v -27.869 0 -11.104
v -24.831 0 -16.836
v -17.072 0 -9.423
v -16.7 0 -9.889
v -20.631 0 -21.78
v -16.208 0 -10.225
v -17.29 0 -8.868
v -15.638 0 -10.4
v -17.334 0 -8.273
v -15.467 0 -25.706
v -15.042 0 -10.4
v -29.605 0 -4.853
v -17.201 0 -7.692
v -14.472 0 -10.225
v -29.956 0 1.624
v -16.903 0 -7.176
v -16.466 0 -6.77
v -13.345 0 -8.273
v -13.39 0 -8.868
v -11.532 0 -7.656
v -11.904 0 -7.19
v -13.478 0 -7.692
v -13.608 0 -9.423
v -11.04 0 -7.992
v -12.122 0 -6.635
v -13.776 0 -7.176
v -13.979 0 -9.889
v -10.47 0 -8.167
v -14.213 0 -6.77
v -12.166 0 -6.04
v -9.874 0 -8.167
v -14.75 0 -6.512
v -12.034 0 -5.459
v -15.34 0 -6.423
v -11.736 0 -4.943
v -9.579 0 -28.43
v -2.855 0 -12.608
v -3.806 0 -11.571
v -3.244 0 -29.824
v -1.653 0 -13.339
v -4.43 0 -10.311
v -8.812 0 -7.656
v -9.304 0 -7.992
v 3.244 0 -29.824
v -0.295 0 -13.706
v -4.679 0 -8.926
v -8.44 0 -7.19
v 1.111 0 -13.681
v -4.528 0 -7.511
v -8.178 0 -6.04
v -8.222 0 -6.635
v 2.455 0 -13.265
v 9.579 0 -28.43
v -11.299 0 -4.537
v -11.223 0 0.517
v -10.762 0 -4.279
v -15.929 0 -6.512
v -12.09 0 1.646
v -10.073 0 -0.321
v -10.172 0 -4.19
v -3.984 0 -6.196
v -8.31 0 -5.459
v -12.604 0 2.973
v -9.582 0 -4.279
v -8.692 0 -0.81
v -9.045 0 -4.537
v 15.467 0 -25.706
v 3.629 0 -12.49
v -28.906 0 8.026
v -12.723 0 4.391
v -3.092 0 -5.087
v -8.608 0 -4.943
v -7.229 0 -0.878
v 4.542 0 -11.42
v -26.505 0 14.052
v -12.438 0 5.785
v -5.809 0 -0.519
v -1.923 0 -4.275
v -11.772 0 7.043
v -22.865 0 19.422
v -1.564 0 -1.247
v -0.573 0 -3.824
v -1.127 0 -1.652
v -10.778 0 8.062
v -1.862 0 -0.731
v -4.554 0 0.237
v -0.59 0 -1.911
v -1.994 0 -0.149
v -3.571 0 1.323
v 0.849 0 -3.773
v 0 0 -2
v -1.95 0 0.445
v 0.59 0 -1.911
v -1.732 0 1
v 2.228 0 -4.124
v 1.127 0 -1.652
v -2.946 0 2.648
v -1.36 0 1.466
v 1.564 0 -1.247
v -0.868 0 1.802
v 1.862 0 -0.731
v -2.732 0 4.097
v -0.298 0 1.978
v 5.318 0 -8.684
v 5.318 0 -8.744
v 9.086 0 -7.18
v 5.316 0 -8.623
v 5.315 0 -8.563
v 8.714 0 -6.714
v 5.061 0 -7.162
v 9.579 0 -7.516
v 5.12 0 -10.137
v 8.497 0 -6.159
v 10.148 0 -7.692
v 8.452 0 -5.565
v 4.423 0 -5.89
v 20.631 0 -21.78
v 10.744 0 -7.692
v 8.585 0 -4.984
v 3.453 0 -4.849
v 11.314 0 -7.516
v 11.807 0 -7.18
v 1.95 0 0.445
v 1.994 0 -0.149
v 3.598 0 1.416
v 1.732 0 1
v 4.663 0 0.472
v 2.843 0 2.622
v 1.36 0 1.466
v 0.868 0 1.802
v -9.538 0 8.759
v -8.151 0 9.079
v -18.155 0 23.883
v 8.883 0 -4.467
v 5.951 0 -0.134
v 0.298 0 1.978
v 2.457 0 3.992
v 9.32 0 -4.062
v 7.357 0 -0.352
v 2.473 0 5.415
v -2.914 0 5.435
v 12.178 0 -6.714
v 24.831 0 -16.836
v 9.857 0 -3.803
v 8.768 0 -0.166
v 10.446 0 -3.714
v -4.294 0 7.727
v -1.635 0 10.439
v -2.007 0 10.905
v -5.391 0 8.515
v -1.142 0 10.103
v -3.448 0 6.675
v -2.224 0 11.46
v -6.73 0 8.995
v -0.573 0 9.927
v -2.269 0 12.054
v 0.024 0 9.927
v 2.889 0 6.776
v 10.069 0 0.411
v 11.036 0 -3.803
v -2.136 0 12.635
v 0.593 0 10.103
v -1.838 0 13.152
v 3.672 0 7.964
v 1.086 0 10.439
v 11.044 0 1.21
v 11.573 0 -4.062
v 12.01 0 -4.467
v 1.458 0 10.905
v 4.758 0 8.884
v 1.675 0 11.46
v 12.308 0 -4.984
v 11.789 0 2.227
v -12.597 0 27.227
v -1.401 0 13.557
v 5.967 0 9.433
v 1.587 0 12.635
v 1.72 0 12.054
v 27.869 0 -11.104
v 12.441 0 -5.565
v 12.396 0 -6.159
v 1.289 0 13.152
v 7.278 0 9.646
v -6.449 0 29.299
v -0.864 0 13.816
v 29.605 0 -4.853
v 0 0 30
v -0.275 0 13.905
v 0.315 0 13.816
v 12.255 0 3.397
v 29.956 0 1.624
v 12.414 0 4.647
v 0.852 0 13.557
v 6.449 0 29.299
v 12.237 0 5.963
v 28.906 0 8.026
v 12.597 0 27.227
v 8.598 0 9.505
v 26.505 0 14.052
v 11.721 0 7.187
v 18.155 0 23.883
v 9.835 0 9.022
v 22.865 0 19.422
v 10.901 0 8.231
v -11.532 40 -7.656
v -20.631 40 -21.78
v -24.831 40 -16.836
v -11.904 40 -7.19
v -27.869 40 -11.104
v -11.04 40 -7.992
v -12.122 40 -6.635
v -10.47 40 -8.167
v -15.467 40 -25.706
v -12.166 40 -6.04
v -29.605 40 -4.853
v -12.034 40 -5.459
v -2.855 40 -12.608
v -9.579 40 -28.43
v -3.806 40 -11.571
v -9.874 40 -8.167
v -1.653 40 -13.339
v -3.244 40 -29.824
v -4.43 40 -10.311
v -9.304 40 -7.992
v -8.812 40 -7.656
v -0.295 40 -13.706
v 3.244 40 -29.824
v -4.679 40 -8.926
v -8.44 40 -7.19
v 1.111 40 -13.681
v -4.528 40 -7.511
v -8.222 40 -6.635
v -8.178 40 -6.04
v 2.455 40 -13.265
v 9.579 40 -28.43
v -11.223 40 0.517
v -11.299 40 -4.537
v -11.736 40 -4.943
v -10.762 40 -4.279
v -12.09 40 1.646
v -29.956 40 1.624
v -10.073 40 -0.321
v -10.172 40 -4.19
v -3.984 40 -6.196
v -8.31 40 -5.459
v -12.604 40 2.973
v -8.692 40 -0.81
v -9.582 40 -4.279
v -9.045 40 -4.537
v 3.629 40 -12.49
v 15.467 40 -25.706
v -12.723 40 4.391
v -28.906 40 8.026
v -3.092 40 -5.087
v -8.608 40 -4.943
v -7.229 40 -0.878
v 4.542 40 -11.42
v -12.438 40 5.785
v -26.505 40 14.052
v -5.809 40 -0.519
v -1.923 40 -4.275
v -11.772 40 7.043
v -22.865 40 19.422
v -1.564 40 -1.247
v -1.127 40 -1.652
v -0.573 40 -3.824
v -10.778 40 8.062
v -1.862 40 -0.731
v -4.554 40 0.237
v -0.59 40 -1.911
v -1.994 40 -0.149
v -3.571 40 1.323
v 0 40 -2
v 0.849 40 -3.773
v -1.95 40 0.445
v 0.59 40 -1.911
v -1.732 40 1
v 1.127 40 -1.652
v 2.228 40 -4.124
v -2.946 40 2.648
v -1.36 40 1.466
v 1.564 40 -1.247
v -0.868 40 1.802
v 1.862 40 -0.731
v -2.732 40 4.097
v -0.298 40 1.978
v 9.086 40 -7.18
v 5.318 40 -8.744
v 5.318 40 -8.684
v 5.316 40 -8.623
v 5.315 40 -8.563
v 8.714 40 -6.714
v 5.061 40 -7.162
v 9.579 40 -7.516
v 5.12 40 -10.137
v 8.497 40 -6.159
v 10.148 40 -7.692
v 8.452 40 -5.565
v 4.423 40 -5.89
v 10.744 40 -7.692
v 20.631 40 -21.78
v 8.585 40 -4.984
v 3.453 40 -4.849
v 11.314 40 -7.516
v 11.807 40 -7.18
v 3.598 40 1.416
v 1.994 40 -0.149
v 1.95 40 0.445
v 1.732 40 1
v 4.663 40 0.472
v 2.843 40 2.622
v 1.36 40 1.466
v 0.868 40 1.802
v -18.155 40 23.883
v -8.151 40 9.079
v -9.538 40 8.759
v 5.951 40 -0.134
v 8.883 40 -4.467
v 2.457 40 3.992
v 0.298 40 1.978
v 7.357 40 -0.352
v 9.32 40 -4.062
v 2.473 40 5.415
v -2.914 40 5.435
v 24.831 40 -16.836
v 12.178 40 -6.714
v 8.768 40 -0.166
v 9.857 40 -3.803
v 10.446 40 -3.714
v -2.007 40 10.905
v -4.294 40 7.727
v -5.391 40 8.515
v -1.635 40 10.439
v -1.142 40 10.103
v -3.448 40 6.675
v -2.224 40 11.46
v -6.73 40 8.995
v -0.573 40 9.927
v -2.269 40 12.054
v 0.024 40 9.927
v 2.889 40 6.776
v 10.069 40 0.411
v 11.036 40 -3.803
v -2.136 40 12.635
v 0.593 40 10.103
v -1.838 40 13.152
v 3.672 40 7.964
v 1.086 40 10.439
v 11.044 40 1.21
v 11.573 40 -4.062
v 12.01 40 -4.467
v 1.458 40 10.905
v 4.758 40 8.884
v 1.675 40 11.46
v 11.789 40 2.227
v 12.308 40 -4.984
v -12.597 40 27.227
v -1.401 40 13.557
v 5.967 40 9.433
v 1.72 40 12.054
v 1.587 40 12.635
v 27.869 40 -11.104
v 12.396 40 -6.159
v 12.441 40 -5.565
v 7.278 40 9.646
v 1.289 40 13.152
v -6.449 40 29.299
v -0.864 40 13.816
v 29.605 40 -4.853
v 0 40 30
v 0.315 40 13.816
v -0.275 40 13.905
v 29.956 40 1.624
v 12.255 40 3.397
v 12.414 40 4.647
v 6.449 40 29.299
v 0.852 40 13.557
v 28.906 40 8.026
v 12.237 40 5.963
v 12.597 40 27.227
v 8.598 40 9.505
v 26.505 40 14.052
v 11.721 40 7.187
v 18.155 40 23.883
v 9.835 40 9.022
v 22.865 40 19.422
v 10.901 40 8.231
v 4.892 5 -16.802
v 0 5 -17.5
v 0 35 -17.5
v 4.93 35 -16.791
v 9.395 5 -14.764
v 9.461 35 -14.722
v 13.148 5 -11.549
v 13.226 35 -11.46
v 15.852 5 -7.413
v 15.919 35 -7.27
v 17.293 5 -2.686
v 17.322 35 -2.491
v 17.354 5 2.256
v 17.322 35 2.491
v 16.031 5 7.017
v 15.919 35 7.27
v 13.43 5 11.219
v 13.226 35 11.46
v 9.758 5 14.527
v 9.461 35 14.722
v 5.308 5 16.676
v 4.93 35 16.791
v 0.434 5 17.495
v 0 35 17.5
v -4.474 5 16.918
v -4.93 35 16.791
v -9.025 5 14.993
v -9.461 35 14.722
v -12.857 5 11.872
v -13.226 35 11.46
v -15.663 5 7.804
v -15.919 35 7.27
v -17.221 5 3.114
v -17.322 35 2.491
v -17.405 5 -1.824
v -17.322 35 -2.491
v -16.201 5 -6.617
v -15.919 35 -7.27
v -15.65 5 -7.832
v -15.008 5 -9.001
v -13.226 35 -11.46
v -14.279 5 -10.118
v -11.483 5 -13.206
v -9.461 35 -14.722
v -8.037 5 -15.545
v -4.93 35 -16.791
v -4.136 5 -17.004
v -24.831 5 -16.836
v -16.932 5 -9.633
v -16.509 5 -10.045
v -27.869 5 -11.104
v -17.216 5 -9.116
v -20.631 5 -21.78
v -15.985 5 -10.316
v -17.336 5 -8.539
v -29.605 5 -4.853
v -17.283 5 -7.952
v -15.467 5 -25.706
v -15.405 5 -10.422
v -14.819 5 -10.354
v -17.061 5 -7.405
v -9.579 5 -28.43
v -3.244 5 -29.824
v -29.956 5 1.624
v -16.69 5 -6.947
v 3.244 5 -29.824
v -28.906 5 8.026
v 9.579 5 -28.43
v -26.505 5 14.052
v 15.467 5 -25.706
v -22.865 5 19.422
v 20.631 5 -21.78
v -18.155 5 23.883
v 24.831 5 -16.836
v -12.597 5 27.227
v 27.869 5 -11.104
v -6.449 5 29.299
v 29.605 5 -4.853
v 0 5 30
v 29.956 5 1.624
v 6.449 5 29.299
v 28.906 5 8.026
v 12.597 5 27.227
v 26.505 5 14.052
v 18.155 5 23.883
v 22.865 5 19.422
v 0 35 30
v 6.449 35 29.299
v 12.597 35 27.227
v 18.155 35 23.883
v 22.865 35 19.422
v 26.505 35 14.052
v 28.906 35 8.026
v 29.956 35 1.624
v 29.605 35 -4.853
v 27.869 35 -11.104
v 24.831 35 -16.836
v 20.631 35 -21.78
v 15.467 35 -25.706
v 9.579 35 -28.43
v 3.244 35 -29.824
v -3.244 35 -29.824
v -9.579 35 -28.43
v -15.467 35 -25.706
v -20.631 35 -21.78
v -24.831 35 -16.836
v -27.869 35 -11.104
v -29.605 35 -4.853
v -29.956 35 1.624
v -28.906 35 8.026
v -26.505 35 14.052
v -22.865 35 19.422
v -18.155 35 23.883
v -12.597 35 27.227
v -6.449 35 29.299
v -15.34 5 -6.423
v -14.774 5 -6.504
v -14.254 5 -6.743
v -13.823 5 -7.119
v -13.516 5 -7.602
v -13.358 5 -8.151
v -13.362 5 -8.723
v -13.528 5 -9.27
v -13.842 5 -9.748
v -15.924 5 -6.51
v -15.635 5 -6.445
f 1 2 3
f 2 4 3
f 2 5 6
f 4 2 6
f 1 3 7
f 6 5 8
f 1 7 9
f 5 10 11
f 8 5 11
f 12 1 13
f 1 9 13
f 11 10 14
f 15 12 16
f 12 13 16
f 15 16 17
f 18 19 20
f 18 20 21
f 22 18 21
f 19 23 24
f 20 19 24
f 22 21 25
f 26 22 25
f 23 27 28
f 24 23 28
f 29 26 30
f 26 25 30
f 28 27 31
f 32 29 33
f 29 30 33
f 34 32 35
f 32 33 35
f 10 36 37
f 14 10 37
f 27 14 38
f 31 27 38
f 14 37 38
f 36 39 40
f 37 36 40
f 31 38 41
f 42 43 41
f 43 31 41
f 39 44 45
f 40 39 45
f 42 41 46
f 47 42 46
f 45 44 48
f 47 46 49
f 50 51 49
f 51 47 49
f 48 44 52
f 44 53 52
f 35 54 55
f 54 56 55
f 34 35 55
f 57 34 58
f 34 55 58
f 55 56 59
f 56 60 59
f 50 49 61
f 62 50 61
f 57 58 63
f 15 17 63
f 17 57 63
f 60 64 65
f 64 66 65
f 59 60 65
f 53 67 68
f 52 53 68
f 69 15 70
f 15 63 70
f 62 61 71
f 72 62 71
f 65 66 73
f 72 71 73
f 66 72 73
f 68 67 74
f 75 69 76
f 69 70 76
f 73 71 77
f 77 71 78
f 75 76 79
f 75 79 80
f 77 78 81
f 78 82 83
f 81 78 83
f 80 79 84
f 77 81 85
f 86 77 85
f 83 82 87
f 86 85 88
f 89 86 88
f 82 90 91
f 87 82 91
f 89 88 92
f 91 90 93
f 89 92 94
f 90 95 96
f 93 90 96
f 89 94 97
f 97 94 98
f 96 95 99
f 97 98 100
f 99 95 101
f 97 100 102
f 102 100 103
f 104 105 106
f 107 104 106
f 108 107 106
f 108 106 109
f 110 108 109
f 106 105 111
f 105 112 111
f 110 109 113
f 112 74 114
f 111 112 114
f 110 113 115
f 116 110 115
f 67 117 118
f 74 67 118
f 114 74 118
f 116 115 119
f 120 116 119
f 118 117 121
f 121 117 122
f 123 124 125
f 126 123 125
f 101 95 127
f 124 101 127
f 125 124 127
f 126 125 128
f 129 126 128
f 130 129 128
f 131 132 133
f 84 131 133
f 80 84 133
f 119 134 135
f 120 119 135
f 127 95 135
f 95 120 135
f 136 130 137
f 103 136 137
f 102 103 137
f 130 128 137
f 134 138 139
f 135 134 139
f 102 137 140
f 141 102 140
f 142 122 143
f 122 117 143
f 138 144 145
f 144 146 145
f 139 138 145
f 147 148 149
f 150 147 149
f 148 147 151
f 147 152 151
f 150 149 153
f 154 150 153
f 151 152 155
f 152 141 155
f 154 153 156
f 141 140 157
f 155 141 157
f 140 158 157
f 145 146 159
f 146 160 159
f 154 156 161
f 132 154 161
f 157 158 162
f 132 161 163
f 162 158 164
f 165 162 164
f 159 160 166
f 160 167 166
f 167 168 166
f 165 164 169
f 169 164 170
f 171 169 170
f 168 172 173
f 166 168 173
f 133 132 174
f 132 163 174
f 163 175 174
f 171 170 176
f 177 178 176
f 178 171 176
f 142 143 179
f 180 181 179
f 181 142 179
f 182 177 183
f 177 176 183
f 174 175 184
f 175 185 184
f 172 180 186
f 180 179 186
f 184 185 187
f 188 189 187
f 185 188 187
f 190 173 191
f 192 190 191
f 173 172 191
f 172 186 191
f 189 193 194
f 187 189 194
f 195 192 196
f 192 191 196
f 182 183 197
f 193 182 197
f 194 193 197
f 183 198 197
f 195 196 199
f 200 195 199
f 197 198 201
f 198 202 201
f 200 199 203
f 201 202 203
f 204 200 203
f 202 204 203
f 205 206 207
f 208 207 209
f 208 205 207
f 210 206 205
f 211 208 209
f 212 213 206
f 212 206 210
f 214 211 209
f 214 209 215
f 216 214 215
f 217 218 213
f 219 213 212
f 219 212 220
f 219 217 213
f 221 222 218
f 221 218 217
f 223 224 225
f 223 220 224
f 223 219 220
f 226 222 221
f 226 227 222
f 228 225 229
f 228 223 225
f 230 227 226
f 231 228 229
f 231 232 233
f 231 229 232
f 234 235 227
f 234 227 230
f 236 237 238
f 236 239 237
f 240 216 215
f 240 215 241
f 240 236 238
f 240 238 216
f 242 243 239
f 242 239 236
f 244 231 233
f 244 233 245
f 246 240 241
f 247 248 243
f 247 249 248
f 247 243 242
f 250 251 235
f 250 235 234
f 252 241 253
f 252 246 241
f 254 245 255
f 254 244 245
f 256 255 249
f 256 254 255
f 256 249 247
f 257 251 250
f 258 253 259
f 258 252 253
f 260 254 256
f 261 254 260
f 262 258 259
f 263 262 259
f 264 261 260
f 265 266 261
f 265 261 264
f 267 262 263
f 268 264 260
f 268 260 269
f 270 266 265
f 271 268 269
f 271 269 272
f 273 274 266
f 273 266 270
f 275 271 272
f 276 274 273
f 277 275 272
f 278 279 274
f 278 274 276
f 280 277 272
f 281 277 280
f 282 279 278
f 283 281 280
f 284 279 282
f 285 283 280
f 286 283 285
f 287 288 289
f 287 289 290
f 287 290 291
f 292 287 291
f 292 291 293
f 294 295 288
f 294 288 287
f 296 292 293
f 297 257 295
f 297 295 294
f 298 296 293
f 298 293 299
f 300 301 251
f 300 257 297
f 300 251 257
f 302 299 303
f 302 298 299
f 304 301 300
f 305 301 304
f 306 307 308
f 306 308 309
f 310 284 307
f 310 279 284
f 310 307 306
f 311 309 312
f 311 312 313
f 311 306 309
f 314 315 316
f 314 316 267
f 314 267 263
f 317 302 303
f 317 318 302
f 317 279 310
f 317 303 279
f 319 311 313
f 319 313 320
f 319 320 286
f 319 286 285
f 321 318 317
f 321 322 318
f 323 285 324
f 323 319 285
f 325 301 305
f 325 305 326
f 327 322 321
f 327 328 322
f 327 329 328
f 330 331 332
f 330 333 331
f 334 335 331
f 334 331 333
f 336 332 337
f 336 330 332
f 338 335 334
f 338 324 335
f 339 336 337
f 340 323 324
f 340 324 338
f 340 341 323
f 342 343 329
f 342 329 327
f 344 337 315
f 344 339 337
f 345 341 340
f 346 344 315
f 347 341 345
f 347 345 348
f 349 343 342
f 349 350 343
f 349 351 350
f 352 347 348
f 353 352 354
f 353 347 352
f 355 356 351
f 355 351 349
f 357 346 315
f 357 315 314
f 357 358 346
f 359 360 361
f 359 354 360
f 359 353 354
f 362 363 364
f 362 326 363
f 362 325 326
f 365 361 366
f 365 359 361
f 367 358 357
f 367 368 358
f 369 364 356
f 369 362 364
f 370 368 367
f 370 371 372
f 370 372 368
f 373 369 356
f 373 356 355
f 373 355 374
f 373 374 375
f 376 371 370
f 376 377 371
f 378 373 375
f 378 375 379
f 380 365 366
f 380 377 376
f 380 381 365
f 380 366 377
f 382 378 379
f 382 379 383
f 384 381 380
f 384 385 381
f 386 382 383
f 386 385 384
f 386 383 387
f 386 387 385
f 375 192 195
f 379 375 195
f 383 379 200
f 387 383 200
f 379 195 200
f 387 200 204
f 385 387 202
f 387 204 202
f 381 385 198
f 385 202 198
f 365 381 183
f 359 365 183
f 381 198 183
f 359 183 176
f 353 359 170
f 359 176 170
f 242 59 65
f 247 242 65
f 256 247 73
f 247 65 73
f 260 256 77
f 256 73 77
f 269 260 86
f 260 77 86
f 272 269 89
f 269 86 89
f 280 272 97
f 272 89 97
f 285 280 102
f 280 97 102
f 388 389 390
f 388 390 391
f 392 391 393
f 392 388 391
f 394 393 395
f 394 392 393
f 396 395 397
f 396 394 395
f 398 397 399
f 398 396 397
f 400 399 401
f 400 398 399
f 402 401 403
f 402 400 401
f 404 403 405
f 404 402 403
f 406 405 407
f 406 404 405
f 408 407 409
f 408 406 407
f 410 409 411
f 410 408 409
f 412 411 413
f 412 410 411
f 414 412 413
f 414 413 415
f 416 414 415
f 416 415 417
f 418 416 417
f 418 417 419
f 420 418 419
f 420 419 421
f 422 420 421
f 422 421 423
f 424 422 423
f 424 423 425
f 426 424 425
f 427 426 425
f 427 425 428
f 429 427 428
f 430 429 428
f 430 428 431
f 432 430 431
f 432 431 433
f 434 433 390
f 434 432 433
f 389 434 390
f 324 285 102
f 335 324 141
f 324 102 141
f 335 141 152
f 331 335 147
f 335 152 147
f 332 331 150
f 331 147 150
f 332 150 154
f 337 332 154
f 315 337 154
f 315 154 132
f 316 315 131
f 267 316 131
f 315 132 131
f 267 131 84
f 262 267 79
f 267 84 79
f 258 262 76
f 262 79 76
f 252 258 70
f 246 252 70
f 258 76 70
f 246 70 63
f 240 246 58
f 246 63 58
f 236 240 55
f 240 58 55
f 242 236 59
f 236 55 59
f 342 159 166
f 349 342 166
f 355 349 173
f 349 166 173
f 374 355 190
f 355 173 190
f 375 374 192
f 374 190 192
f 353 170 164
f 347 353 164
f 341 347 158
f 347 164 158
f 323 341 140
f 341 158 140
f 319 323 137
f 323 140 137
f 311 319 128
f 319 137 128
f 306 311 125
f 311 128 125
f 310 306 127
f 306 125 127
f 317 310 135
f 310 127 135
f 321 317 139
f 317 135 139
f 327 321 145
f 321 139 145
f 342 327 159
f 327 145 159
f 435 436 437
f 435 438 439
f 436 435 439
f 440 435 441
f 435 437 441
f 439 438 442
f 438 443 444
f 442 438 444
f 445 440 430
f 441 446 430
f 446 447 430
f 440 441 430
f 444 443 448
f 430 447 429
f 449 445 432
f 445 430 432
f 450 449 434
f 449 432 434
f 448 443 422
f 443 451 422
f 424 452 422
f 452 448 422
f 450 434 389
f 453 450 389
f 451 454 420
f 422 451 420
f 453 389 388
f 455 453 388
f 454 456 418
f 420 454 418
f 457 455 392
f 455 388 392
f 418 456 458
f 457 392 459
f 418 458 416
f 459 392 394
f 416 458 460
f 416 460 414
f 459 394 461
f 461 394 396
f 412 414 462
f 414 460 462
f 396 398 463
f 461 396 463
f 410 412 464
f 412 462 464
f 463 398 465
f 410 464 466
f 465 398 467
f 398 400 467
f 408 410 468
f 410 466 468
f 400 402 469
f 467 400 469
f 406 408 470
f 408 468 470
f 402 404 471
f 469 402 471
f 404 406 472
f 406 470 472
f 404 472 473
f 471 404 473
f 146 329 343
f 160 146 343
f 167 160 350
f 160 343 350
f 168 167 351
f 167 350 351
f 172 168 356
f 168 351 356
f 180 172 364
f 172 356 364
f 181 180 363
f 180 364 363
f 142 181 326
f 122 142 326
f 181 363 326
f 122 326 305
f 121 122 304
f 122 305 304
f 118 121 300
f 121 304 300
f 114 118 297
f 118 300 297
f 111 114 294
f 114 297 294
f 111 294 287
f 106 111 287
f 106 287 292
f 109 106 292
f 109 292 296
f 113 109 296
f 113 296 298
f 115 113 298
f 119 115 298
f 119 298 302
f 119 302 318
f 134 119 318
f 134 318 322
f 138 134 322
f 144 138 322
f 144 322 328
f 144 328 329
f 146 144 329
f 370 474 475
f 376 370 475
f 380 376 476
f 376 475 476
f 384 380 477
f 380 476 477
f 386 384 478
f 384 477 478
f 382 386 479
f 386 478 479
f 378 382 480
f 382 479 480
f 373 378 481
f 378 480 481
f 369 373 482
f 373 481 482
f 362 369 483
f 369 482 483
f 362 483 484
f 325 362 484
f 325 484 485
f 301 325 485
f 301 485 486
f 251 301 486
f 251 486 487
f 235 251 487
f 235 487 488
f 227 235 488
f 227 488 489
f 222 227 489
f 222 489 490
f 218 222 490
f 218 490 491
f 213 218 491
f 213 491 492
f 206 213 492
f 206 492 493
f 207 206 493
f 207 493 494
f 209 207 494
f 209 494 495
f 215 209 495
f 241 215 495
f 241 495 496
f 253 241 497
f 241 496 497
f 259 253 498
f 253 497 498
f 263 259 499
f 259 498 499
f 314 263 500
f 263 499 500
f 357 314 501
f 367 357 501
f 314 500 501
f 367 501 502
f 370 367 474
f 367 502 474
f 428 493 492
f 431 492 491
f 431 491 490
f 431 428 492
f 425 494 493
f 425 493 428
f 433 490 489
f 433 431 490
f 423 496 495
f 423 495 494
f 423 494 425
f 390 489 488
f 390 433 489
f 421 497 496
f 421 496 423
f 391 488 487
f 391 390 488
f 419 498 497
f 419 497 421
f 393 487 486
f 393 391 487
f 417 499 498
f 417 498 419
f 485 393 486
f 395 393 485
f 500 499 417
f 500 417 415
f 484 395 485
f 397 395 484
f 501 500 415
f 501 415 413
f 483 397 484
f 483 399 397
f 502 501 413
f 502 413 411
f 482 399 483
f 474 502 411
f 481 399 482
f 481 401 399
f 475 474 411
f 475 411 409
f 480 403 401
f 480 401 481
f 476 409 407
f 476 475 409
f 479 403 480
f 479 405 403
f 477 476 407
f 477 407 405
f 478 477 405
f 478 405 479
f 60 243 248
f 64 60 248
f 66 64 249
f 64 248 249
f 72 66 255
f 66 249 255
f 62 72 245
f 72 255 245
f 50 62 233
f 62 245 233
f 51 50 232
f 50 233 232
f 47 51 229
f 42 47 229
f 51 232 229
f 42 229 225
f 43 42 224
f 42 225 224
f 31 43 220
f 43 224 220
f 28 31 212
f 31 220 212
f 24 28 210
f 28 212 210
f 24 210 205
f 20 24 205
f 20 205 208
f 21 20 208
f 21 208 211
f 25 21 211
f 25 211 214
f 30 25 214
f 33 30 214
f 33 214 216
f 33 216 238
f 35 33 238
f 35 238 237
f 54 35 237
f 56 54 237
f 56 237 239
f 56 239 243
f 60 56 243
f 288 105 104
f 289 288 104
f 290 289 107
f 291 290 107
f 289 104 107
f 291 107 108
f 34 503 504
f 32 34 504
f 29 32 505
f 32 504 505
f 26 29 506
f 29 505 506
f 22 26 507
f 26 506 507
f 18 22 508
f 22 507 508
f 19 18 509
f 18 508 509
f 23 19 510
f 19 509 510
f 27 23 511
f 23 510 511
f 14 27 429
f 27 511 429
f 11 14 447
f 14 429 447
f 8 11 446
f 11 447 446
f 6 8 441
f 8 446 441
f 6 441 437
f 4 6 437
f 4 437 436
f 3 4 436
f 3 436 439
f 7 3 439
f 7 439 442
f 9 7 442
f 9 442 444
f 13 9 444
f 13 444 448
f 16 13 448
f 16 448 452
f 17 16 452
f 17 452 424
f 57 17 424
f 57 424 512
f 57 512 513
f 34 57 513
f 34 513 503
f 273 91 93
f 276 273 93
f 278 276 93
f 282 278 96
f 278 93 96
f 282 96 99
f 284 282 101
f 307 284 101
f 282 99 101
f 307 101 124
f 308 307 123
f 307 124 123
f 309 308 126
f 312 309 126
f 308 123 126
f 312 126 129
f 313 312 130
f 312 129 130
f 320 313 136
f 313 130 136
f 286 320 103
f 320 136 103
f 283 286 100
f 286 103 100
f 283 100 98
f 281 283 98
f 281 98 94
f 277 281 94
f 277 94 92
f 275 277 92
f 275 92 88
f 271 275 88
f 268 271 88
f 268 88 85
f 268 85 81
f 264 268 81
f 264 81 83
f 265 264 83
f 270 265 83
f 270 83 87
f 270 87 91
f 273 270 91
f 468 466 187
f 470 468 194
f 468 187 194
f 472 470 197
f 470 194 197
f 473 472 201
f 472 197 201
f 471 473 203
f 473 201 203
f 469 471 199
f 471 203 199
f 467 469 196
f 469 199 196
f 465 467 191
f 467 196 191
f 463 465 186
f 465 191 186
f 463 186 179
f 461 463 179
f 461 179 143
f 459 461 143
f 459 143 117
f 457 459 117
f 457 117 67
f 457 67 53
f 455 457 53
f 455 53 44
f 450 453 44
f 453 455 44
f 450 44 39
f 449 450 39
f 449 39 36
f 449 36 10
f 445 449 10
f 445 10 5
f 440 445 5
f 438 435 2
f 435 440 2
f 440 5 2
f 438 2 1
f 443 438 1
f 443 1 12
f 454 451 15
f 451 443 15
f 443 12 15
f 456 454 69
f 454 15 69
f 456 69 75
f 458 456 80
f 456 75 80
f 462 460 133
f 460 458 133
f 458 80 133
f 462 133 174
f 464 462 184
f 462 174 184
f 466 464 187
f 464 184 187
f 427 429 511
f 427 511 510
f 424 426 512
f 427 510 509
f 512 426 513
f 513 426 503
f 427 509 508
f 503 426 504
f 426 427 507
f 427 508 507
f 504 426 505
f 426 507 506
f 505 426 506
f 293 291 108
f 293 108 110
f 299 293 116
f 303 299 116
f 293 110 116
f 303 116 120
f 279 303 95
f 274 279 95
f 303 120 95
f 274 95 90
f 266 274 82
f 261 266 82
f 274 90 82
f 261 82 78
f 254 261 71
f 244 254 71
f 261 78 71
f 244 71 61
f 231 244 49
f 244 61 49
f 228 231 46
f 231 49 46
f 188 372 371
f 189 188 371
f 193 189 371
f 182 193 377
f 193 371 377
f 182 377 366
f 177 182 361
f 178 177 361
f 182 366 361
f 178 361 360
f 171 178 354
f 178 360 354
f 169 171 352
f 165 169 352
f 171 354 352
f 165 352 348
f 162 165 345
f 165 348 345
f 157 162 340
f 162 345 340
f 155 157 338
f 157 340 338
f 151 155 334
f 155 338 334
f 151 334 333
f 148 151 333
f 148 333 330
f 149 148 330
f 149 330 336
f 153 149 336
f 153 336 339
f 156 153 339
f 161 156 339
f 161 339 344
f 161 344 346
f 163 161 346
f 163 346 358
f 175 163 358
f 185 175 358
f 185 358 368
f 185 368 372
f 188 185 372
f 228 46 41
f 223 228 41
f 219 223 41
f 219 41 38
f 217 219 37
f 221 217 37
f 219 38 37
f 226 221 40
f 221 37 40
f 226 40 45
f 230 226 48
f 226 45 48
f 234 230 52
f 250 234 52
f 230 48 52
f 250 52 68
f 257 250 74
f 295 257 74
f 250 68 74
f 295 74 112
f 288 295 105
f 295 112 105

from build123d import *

# Parameters (mm, degrees)
SKETCH1_R           = 30
BOSS_EXTRUDE1_DEPTH = 40
CUT_EXTRUDE1_START  = -5
SKETCH2_OUTSIDE_W   = 80.762
SKETCH2_OUTSIDE_H   = 80.762
SKETCH2_OUTSIDE_R   = 17.5
CUT_EXTRUDE1_DEPTH  = 30
SKETCH3_R           = 2
CUT_EXTRUDE2_DEPTH  = 59.309518948
CUT_EXTRUDE3_DEPTH  = 59.309518948
CUT_EXTRUDE4_REACH  = 57
SKETCH5_R           = 2
SKETCH8_R           = 2
CUT_EXTRUDE5_DEPTH  = 59.309518948


with BuildPart() as part:
    # Sketch1 → Boss-Extrude1 (new body)
    with BuildSketch(Plane(origin=(0, 0, 0), x_dir=(1, 0, 0), z_dir=(0, 1, 0))):
        with Locations(Location((0, 0, 0), (0, 0, 270))):
            Circle(SKETCH1_R)
    extrude(amount=BOSS_EXTRUDE1_DEPTH)

    # Sketch2 outside → Cut-Extrude1 (cut)
    with BuildSketch(Plane.XZ.offset(CUT_EXTRUDE1_START)):
        Rectangle(SKETCH2_OUTSIDE_W, SKETCH2_OUTSIDE_H)
        with Locations(Location((0, 0, 0), (0, 0, 270))):
            Circle(SKETCH2_OUTSIDE_R, mode=Mode.SUBTRACT)
    extrude(amount=-CUT_EXTRUDE1_DEPTH, mode=Mode.SUBTRACT)

    # Sketch3 → Cut-Extrude2 (cut, through all)
    with BuildSketch(Plane.XZ):
        with Locations(Location((0, 0, 0), (0, 0, 270))):
            Circle(SKETCH3_R)
    extrude(amount=-CUT_EXTRUDE2_DEPTH, mode=Mode.SUBTRACT)

    # Sketch4 → Cut-Extrude3 (cut, through all)
    with BuildSketch(Plane.XZ):
        with BuildLine():
            ThreePointArc((5.314601624, -8.562564428), (0.136244015, -3.747524192), (-4.678796221, -8.925881801))
            Line((-4.678796221, -8.925881801), (5.314601624, -8.562564428))
        make_face()
        with BuildLine():
            Line((5.314601624, -8.562564428), (-4.678796221, -8.925881801))
            ThreePointArc((-4.678796221, -8.925881801), (0.40874704, -13.743397777), (5.317902702, -8.744223114))
            ThreePointArc((5.317902702, -8.744223114), (5.317077364, -8.653378776), (5.314601624, -8.562564428))
        make_face()
        with BuildLine():
            ThreePointArc((4.758097504, 8.883862231), (3.177329144, 1.991752874), (10.069438501, 0.410984514))
            Line((10.069438501, 0.410984514), (4.758097504, 8.883862231))
        make_face()
        with BuildLine():
            Line((4.758097504, 8.883862231), (10.069438501, 0.410984514))
            ThreePointArc((10.069438501, 0.410984514), (11.788602428, 2.226509547), (12.413768003, 4.647423373))
            ThreePointArc((12.413768003, 4.647423373), (9.834681829, 9.022257798), (4.758097504, 8.883862231))
        make_face()
        with BuildLine():
            ThreePointArc((-5.39064228, 8.514897287), (-12.149768249, 6.437828165), (-10.072699128, -0.321297804))
            Line((-10.072699128, -0.321297804), (-5.39064228, 8.514897287))
        make_face()
        with BuildLine():
            Line((-5.39064228, 8.514897287), (-10.072699128, -0.321297804))
            ThreePointArc((-10.072699128, -0.321297804), (-5.153409868, -0.187190345), (-2.731670704, 4.096799742))
            ThreePointArc((-2.731670704, 4.096799742), (-3.447680618, 6.675060578), (-5.39064228, 8.514897287))
        make_face()
    extrude(amount=-CUT_EXTRUDE3_DEPTH, mode=Mode.SUBTRACT)

    # Sketch5 → Cut-Extrude4 (cut, up to next)
    with BuildSketch(Plane(origin=(0, 5, 0), x_dir=(1, 0, 0), z_dir=(0, 1, 0)), mode=Mode.PRIVATE) as cut_extrude4_sk1:
        with Locations(Location((-15.339737127, 8.422734999, 0), (0, 0, 270))):
            Circle(SKETCH5_R)
    cut_extrude4_tool1 = extrude(cut_extrude4_sk1.sketch, amount=-CUT_EXTRUDE4_REACH, mode=Mode.PRIVATE) & part.part
    add(cut_extrude4_tool1.solids().sort_by_distance((-15.339737, 5, -8.422735))[0], mode=Mode.SUBTRACT)

    # Sketch8 → Cut-Extrude5 (cut, through all)
    with BuildSketch(Plane(origin=(0, 40, 0), x_dir=(1, 0, 0), z_dir=(0, 1, 0))):
        with Locations(Location((-0.274503836, -11.904684903, 0), (0, 0, 270))):
            Circle(SKETCH8_R)
        with Locations(Location((10.446409645, 5.714285954, 0), (0, 0, 270))):
            Circle(SKETCH8_R)
        with Locations(Location((-10.172001933, 6.189762023, 0), (0, 0, 270))):
            Circle(SKETCH8_R)
    extrude(amount=-CUT_EXTRUDE5_DEPTH, mode=Mode.SUBTRACT)


solid = part.part
